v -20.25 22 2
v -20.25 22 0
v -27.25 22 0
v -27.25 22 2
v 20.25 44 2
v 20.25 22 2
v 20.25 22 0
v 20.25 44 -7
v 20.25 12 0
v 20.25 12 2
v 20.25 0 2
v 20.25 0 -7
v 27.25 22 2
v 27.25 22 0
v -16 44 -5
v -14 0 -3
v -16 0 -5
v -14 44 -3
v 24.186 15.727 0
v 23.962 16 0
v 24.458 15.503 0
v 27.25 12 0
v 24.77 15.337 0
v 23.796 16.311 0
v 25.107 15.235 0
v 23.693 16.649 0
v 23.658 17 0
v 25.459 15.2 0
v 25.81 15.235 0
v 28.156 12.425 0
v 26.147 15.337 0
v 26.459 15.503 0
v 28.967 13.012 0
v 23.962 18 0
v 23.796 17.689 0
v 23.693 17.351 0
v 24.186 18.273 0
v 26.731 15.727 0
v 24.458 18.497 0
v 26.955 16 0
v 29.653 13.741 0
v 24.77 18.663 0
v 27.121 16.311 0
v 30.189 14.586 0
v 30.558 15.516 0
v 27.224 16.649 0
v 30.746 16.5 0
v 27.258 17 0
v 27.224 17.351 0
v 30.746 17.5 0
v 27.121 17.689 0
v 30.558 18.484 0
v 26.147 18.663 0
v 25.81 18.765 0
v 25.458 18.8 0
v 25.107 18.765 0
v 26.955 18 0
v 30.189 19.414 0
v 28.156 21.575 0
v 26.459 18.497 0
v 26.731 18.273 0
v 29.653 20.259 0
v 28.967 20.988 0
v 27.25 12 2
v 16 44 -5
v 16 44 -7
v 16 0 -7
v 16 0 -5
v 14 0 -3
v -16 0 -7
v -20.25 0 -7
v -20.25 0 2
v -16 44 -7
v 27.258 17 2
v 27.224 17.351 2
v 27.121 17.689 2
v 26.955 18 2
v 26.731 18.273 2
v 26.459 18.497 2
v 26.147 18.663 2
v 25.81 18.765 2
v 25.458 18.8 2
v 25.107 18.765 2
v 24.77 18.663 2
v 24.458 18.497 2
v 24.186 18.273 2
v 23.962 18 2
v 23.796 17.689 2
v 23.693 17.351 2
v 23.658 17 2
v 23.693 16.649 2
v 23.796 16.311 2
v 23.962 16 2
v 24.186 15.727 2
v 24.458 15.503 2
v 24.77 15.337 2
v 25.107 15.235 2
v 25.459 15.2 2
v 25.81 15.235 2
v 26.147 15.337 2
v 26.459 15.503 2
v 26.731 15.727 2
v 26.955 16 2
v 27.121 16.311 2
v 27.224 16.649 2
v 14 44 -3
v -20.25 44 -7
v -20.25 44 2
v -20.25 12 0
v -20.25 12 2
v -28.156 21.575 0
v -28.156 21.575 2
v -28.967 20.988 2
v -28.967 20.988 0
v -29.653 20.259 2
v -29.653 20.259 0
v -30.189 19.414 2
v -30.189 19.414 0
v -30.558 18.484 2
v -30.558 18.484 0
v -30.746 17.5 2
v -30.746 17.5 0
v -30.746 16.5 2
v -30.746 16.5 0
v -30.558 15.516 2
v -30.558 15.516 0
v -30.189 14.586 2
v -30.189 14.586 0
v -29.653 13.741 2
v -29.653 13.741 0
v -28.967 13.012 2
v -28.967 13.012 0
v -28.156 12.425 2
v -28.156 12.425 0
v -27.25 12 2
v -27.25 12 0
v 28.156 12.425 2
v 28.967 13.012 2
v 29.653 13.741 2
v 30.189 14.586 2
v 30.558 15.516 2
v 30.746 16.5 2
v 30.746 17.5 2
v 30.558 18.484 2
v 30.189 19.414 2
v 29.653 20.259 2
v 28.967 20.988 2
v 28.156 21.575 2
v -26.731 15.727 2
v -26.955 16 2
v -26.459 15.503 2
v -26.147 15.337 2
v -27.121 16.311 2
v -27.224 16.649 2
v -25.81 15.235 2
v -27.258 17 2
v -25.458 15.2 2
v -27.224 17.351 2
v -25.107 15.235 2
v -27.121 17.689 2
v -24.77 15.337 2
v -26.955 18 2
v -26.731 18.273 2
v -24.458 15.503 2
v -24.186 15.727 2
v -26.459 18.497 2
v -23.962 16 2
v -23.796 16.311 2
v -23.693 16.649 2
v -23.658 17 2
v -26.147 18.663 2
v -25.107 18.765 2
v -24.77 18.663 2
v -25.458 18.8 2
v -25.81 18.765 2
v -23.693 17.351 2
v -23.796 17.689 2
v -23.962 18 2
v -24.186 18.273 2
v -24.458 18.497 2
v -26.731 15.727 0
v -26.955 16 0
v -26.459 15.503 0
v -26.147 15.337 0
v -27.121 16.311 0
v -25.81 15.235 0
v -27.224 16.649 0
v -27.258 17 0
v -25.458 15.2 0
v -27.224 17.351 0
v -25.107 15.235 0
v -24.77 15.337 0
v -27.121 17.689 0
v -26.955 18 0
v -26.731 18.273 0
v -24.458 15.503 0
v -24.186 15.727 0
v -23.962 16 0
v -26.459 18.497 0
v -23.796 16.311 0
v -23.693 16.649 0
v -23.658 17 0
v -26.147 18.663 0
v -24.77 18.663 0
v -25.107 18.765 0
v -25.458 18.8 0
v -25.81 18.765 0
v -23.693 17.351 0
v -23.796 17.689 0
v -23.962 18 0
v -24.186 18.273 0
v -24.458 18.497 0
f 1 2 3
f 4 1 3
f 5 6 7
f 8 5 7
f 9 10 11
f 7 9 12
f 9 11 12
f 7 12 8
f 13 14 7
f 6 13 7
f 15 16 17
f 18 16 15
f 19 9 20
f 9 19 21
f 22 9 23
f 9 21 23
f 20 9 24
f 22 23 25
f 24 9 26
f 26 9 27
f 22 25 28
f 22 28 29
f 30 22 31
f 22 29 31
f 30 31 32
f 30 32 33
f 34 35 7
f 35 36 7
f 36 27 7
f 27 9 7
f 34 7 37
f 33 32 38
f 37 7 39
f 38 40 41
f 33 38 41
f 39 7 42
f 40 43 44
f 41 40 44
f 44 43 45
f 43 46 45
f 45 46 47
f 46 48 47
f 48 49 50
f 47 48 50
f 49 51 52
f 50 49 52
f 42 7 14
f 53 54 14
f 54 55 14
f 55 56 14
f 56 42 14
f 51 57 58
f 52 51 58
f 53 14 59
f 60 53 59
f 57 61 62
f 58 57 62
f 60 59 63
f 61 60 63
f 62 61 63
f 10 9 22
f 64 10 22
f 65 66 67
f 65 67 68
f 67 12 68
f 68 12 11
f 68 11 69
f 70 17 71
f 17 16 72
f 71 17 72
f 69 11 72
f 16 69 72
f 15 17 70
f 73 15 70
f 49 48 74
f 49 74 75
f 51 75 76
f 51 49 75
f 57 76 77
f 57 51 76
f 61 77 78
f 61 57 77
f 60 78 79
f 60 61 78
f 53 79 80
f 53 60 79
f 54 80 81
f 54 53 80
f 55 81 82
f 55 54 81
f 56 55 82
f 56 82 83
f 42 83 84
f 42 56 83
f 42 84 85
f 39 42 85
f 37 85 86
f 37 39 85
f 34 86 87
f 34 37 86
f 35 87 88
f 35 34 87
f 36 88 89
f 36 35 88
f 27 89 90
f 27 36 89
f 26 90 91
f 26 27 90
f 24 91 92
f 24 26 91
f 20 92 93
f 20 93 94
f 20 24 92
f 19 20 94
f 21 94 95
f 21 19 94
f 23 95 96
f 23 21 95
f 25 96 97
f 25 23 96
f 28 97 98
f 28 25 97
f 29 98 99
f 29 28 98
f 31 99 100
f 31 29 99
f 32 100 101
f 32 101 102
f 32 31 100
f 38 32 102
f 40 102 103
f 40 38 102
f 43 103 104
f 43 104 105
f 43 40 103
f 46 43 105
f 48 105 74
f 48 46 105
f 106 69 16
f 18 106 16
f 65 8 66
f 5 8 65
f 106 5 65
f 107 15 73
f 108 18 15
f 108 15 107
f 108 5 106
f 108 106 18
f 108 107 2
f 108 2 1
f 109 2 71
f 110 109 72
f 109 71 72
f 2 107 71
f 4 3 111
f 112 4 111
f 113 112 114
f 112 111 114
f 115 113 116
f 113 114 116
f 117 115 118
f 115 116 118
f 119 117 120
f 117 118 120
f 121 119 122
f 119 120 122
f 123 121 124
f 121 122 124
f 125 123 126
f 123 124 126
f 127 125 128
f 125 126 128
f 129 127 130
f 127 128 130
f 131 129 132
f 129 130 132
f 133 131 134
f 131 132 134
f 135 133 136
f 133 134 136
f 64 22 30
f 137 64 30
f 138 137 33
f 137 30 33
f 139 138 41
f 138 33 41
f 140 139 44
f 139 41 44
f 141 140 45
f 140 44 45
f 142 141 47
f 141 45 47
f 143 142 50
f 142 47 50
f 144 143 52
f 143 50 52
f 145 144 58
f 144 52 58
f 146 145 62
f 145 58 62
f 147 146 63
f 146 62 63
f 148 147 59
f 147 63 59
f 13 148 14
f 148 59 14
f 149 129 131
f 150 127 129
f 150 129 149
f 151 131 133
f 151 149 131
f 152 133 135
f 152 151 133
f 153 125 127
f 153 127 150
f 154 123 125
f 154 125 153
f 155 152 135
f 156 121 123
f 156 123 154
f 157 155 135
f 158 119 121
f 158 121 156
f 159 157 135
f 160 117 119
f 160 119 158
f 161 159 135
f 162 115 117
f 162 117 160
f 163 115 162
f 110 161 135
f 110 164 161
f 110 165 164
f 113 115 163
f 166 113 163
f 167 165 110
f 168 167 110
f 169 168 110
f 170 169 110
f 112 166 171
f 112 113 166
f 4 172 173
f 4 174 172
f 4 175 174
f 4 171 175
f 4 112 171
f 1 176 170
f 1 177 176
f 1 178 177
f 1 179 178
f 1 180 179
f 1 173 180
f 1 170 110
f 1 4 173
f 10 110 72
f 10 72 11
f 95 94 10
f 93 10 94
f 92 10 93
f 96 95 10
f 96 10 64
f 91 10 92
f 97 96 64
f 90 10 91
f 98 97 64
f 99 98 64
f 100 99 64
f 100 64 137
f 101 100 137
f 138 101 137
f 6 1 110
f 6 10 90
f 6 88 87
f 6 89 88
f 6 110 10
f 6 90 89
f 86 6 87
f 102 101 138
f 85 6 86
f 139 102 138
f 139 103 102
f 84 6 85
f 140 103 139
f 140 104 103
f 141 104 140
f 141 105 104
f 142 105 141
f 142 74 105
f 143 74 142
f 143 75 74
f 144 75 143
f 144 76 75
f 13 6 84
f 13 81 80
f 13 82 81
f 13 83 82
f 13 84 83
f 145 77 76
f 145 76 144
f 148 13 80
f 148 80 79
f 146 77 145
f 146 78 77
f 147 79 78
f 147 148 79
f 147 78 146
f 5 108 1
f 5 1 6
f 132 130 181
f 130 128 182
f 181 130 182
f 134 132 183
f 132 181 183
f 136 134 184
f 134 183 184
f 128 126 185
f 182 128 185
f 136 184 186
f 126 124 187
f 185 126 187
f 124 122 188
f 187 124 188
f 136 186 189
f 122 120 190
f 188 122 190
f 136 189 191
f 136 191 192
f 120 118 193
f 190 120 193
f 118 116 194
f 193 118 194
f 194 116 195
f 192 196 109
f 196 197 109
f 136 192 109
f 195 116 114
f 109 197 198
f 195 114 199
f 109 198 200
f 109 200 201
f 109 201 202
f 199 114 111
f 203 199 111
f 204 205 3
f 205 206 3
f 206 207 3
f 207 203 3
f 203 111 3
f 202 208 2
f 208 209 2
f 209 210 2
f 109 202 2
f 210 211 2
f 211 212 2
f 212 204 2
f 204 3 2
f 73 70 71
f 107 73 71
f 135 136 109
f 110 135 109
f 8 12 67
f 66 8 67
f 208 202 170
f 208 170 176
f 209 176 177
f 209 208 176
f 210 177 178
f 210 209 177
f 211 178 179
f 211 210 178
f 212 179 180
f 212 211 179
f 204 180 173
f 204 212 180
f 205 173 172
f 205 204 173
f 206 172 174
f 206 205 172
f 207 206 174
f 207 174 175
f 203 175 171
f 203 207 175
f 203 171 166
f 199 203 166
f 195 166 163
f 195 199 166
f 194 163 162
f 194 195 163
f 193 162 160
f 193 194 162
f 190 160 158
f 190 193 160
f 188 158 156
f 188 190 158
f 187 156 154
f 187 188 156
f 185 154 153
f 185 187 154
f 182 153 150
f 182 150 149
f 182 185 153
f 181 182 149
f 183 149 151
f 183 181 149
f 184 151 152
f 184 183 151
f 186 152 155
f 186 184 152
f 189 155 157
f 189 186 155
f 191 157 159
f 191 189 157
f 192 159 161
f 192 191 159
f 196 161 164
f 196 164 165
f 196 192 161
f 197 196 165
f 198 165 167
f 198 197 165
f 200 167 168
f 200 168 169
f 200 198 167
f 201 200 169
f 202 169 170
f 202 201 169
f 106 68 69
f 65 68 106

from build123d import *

# Parameters (mm, degrees)
EXTRUDE001_DEPTH                     = 44
EXTRUDE001_ONTO_SKETCH001_ROLL_ANGLE = 90
SKETCH_R                             = 1.8
EXTRUDE_DEPTH                        = 2
CHAMFER_SIZE                         = 2


with BuildPart() as extrude001:
    # Sketch001 as drawn → Extrude001 (new)
    with BuildSketch(Plane.XY):
        Polygon((-20.25, 0), (20.25, 0), (20.25, -7), (16, -7), (16, -3), (-16, -3), (-16, -7), (-20.25, -7), align=None)
    extrude(amount=-EXTRUDE001_DEPTH)


with BuildPart() as extrude001_1:
    # Extrude001 onto Sketch001 roll: moved
    add(extrude001.part.rotate(Axis((0, 0, 0), (1, 0, 0)), EXTRUDE001_ONTO_SKETCH001_ROLL_ANGLE))


with BuildPart() as extrude001_2:
    # Extrude001 onto Sketch001 placement: moved
    add(extrude001_1.part)


with BuildPart() as chamfer_body:
    # Sketch → Extrude (new body)
    with BuildSketch(Plane.XY):
        with BuildLine():
            Line((-20.25, 44), (-20.25, 22))
            Line((-20.25, 22), (-27.25, 22))
            ThreePointArc((-27.25, 22), (-30.769759, 17), (-27.25, 12))
            Line((-27.25, 12), (-20.25, 12))
            Line((-20.25, 12), (-20.25, 0))
            Line((-20.25, 0), (20.25, 0))
            Line((20.25, 0), (20.25, 12))
            Line((20.25, 12), (27.25, 12))
            ThreePointArc((27.25, 12), (30.769759, 17), (27.25, 22))
            Line((27.25, 22), (20.25, 22))
            Line((20.25, 22), (20.25, 44))
            Line((20.25, 44), (-20.25, 44))
        make_face()
        with Locations((-25.4585, 17)):
            Circle(SKETCH_R, mode=Mode.SUBTRACT)
        with Locations((25.4585, 17)):
            Circle(SKETCH_R, mode=Mode.SUBTRACT)
    extrude(amount=EXTRUDE_DEPTH)

    # Fusion: union Extrude001
    add(extrude001_2.part)

    # Chamfer
    chamfer_edges = [chamfer_body.edges().sort_by_distance(p)[0] for p in [
        (-16, 22, -3),
        (16, 22, -3),
    ]]
    chamfer(chamfer_edges, length=CHAMFER_SIZE)


solid = chamfer_body.part
